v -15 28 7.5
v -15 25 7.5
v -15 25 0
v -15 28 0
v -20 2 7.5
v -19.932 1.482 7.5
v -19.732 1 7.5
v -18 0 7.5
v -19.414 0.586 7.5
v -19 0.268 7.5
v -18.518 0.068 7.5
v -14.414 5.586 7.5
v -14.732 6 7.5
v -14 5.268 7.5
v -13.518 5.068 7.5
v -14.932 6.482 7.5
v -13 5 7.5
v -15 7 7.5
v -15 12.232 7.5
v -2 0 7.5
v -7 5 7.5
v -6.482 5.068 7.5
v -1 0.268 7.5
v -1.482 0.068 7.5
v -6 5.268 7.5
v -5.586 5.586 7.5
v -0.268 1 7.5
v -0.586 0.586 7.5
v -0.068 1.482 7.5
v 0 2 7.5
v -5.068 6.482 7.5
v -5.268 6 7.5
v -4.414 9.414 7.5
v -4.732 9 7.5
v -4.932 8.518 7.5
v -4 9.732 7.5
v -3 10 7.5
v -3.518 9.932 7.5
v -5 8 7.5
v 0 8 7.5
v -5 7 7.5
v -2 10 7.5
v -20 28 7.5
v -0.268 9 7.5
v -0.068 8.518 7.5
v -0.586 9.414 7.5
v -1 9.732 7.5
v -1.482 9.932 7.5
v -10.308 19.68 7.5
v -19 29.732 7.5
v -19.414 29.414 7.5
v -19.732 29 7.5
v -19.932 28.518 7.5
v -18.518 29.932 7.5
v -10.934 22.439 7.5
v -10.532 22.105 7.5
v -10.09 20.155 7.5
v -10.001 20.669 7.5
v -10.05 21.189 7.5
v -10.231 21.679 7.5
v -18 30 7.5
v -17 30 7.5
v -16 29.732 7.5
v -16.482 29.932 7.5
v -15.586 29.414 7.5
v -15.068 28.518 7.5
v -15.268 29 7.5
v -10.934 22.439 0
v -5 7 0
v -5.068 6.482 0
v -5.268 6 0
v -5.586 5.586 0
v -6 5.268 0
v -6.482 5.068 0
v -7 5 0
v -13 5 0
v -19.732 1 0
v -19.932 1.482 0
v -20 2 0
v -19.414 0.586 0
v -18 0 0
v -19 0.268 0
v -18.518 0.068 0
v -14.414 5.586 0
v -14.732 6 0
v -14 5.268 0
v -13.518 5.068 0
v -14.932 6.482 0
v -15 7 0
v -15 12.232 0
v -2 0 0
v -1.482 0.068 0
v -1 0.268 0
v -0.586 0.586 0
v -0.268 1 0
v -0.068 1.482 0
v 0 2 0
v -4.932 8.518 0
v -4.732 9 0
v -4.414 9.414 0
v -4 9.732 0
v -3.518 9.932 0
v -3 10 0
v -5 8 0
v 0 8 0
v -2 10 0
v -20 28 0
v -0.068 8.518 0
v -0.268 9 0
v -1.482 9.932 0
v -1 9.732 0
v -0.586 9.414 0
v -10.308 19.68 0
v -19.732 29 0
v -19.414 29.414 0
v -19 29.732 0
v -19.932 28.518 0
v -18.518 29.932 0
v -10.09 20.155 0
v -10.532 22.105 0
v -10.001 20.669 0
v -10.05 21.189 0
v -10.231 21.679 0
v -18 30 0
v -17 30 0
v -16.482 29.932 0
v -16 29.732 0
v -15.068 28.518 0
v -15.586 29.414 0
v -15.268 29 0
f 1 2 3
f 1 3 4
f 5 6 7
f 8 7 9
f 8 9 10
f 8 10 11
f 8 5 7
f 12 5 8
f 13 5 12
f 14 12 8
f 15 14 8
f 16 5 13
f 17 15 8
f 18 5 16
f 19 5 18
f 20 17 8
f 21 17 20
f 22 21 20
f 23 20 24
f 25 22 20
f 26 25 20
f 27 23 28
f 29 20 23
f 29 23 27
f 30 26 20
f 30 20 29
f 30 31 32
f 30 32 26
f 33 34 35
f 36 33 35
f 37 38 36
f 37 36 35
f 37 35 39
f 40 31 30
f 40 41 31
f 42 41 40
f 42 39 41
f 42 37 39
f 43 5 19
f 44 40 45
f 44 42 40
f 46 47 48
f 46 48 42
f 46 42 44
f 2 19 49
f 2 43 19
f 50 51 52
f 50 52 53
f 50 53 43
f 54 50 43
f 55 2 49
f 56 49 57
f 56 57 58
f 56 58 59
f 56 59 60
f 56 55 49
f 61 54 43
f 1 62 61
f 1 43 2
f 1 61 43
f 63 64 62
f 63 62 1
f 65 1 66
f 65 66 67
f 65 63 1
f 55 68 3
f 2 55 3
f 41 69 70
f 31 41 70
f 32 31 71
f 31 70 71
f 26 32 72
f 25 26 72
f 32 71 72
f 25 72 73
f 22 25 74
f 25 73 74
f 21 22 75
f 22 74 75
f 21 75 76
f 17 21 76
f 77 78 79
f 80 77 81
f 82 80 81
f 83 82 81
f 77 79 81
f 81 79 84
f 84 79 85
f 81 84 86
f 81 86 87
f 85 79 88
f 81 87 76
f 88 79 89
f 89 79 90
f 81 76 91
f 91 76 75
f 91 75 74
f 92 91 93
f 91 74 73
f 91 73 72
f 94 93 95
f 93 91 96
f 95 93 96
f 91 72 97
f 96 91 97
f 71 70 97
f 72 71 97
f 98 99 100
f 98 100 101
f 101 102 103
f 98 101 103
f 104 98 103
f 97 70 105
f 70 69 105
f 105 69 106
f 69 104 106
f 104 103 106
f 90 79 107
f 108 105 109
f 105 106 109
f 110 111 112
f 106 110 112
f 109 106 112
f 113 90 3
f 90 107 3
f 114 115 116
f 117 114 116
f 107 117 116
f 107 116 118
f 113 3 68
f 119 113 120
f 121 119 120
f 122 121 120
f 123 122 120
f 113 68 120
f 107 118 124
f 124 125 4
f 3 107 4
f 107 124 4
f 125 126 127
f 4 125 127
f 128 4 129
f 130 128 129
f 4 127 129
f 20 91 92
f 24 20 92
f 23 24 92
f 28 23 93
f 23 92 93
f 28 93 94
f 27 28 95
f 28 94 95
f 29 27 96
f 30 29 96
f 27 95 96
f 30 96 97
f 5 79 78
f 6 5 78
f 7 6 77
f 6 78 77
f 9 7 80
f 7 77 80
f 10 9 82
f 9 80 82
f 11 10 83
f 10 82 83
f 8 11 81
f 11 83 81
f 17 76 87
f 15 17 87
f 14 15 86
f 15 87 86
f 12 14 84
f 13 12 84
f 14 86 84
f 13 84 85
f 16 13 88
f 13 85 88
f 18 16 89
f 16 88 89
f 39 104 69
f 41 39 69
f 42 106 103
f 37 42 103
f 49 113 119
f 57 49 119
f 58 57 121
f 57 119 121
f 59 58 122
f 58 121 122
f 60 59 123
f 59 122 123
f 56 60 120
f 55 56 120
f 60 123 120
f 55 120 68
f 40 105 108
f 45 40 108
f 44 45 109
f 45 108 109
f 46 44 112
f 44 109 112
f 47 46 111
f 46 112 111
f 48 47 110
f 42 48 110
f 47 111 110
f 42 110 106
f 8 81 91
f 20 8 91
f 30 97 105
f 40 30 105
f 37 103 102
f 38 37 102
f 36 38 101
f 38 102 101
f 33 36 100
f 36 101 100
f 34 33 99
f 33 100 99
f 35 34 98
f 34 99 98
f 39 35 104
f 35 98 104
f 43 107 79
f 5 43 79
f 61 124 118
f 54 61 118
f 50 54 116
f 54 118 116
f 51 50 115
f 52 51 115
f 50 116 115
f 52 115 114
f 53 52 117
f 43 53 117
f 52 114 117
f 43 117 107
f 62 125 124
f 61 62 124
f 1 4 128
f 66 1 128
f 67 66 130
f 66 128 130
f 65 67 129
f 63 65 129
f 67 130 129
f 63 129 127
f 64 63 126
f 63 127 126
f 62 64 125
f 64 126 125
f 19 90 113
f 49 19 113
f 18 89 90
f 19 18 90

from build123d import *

# Parameters (mm, degrees)
F1_DEPTH = 7.5


with BuildPart() as f1:
    # F0 (on Top) → F1 (new body)
    with BuildSketch(Plane.XY):
        with BuildLine():
            ThreePointArc((-18, 30), (-19.414214, 29.414214), (-20, 28))
            Line((-20, 28), (-20, 2))
            ThreePointArc((-20, 2), (-19.414214, 0.585786), (-18, 0))
            Line((-18, 0), (-2, 0))
            ThreePointArc((-2, 0), (-0.585786, 0.585786), (0, 2))
            Line((0, 2), (0, 8))
            ThreePointArc((0, 8), (-0.585786, 9.414214), (-2, 10))
            Line((-2, 10), (-3, 10))
            ThreePointArc((-3, 10), (-4.414214, 9.414214), (-5, 8))
            Line((-5, 8), (-5, 7))
            ThreePointArc((-5, 7), (-5.585786, 5.585786), (-7, 5))
            Line((-7, 5), (-13, 5))
            ThreePointArc((-13, 5), (-14.414214, 5.585786), (-15, 7))
            Line((-15, 7), (-15, 12.231735))
            Line((-15, 12.231735), (-10.307771, 19.680434))
            ThreePointArc((-10.307771, 19.680434), (-10.049636, 21.189245), (-10.933998, 22.438665))
            Line((-10.933998, 22.438665), (-15, 25))
            Line((-15, 25), (-15, 28))
            ThreePointArc((-15, 28), (-15.585786, 29.414214), (-17, 30))
            Line((-17, 30), (-18, 30))
        make_face()
    extrude(amount=F1_DEPTH)


solid = f1.part
